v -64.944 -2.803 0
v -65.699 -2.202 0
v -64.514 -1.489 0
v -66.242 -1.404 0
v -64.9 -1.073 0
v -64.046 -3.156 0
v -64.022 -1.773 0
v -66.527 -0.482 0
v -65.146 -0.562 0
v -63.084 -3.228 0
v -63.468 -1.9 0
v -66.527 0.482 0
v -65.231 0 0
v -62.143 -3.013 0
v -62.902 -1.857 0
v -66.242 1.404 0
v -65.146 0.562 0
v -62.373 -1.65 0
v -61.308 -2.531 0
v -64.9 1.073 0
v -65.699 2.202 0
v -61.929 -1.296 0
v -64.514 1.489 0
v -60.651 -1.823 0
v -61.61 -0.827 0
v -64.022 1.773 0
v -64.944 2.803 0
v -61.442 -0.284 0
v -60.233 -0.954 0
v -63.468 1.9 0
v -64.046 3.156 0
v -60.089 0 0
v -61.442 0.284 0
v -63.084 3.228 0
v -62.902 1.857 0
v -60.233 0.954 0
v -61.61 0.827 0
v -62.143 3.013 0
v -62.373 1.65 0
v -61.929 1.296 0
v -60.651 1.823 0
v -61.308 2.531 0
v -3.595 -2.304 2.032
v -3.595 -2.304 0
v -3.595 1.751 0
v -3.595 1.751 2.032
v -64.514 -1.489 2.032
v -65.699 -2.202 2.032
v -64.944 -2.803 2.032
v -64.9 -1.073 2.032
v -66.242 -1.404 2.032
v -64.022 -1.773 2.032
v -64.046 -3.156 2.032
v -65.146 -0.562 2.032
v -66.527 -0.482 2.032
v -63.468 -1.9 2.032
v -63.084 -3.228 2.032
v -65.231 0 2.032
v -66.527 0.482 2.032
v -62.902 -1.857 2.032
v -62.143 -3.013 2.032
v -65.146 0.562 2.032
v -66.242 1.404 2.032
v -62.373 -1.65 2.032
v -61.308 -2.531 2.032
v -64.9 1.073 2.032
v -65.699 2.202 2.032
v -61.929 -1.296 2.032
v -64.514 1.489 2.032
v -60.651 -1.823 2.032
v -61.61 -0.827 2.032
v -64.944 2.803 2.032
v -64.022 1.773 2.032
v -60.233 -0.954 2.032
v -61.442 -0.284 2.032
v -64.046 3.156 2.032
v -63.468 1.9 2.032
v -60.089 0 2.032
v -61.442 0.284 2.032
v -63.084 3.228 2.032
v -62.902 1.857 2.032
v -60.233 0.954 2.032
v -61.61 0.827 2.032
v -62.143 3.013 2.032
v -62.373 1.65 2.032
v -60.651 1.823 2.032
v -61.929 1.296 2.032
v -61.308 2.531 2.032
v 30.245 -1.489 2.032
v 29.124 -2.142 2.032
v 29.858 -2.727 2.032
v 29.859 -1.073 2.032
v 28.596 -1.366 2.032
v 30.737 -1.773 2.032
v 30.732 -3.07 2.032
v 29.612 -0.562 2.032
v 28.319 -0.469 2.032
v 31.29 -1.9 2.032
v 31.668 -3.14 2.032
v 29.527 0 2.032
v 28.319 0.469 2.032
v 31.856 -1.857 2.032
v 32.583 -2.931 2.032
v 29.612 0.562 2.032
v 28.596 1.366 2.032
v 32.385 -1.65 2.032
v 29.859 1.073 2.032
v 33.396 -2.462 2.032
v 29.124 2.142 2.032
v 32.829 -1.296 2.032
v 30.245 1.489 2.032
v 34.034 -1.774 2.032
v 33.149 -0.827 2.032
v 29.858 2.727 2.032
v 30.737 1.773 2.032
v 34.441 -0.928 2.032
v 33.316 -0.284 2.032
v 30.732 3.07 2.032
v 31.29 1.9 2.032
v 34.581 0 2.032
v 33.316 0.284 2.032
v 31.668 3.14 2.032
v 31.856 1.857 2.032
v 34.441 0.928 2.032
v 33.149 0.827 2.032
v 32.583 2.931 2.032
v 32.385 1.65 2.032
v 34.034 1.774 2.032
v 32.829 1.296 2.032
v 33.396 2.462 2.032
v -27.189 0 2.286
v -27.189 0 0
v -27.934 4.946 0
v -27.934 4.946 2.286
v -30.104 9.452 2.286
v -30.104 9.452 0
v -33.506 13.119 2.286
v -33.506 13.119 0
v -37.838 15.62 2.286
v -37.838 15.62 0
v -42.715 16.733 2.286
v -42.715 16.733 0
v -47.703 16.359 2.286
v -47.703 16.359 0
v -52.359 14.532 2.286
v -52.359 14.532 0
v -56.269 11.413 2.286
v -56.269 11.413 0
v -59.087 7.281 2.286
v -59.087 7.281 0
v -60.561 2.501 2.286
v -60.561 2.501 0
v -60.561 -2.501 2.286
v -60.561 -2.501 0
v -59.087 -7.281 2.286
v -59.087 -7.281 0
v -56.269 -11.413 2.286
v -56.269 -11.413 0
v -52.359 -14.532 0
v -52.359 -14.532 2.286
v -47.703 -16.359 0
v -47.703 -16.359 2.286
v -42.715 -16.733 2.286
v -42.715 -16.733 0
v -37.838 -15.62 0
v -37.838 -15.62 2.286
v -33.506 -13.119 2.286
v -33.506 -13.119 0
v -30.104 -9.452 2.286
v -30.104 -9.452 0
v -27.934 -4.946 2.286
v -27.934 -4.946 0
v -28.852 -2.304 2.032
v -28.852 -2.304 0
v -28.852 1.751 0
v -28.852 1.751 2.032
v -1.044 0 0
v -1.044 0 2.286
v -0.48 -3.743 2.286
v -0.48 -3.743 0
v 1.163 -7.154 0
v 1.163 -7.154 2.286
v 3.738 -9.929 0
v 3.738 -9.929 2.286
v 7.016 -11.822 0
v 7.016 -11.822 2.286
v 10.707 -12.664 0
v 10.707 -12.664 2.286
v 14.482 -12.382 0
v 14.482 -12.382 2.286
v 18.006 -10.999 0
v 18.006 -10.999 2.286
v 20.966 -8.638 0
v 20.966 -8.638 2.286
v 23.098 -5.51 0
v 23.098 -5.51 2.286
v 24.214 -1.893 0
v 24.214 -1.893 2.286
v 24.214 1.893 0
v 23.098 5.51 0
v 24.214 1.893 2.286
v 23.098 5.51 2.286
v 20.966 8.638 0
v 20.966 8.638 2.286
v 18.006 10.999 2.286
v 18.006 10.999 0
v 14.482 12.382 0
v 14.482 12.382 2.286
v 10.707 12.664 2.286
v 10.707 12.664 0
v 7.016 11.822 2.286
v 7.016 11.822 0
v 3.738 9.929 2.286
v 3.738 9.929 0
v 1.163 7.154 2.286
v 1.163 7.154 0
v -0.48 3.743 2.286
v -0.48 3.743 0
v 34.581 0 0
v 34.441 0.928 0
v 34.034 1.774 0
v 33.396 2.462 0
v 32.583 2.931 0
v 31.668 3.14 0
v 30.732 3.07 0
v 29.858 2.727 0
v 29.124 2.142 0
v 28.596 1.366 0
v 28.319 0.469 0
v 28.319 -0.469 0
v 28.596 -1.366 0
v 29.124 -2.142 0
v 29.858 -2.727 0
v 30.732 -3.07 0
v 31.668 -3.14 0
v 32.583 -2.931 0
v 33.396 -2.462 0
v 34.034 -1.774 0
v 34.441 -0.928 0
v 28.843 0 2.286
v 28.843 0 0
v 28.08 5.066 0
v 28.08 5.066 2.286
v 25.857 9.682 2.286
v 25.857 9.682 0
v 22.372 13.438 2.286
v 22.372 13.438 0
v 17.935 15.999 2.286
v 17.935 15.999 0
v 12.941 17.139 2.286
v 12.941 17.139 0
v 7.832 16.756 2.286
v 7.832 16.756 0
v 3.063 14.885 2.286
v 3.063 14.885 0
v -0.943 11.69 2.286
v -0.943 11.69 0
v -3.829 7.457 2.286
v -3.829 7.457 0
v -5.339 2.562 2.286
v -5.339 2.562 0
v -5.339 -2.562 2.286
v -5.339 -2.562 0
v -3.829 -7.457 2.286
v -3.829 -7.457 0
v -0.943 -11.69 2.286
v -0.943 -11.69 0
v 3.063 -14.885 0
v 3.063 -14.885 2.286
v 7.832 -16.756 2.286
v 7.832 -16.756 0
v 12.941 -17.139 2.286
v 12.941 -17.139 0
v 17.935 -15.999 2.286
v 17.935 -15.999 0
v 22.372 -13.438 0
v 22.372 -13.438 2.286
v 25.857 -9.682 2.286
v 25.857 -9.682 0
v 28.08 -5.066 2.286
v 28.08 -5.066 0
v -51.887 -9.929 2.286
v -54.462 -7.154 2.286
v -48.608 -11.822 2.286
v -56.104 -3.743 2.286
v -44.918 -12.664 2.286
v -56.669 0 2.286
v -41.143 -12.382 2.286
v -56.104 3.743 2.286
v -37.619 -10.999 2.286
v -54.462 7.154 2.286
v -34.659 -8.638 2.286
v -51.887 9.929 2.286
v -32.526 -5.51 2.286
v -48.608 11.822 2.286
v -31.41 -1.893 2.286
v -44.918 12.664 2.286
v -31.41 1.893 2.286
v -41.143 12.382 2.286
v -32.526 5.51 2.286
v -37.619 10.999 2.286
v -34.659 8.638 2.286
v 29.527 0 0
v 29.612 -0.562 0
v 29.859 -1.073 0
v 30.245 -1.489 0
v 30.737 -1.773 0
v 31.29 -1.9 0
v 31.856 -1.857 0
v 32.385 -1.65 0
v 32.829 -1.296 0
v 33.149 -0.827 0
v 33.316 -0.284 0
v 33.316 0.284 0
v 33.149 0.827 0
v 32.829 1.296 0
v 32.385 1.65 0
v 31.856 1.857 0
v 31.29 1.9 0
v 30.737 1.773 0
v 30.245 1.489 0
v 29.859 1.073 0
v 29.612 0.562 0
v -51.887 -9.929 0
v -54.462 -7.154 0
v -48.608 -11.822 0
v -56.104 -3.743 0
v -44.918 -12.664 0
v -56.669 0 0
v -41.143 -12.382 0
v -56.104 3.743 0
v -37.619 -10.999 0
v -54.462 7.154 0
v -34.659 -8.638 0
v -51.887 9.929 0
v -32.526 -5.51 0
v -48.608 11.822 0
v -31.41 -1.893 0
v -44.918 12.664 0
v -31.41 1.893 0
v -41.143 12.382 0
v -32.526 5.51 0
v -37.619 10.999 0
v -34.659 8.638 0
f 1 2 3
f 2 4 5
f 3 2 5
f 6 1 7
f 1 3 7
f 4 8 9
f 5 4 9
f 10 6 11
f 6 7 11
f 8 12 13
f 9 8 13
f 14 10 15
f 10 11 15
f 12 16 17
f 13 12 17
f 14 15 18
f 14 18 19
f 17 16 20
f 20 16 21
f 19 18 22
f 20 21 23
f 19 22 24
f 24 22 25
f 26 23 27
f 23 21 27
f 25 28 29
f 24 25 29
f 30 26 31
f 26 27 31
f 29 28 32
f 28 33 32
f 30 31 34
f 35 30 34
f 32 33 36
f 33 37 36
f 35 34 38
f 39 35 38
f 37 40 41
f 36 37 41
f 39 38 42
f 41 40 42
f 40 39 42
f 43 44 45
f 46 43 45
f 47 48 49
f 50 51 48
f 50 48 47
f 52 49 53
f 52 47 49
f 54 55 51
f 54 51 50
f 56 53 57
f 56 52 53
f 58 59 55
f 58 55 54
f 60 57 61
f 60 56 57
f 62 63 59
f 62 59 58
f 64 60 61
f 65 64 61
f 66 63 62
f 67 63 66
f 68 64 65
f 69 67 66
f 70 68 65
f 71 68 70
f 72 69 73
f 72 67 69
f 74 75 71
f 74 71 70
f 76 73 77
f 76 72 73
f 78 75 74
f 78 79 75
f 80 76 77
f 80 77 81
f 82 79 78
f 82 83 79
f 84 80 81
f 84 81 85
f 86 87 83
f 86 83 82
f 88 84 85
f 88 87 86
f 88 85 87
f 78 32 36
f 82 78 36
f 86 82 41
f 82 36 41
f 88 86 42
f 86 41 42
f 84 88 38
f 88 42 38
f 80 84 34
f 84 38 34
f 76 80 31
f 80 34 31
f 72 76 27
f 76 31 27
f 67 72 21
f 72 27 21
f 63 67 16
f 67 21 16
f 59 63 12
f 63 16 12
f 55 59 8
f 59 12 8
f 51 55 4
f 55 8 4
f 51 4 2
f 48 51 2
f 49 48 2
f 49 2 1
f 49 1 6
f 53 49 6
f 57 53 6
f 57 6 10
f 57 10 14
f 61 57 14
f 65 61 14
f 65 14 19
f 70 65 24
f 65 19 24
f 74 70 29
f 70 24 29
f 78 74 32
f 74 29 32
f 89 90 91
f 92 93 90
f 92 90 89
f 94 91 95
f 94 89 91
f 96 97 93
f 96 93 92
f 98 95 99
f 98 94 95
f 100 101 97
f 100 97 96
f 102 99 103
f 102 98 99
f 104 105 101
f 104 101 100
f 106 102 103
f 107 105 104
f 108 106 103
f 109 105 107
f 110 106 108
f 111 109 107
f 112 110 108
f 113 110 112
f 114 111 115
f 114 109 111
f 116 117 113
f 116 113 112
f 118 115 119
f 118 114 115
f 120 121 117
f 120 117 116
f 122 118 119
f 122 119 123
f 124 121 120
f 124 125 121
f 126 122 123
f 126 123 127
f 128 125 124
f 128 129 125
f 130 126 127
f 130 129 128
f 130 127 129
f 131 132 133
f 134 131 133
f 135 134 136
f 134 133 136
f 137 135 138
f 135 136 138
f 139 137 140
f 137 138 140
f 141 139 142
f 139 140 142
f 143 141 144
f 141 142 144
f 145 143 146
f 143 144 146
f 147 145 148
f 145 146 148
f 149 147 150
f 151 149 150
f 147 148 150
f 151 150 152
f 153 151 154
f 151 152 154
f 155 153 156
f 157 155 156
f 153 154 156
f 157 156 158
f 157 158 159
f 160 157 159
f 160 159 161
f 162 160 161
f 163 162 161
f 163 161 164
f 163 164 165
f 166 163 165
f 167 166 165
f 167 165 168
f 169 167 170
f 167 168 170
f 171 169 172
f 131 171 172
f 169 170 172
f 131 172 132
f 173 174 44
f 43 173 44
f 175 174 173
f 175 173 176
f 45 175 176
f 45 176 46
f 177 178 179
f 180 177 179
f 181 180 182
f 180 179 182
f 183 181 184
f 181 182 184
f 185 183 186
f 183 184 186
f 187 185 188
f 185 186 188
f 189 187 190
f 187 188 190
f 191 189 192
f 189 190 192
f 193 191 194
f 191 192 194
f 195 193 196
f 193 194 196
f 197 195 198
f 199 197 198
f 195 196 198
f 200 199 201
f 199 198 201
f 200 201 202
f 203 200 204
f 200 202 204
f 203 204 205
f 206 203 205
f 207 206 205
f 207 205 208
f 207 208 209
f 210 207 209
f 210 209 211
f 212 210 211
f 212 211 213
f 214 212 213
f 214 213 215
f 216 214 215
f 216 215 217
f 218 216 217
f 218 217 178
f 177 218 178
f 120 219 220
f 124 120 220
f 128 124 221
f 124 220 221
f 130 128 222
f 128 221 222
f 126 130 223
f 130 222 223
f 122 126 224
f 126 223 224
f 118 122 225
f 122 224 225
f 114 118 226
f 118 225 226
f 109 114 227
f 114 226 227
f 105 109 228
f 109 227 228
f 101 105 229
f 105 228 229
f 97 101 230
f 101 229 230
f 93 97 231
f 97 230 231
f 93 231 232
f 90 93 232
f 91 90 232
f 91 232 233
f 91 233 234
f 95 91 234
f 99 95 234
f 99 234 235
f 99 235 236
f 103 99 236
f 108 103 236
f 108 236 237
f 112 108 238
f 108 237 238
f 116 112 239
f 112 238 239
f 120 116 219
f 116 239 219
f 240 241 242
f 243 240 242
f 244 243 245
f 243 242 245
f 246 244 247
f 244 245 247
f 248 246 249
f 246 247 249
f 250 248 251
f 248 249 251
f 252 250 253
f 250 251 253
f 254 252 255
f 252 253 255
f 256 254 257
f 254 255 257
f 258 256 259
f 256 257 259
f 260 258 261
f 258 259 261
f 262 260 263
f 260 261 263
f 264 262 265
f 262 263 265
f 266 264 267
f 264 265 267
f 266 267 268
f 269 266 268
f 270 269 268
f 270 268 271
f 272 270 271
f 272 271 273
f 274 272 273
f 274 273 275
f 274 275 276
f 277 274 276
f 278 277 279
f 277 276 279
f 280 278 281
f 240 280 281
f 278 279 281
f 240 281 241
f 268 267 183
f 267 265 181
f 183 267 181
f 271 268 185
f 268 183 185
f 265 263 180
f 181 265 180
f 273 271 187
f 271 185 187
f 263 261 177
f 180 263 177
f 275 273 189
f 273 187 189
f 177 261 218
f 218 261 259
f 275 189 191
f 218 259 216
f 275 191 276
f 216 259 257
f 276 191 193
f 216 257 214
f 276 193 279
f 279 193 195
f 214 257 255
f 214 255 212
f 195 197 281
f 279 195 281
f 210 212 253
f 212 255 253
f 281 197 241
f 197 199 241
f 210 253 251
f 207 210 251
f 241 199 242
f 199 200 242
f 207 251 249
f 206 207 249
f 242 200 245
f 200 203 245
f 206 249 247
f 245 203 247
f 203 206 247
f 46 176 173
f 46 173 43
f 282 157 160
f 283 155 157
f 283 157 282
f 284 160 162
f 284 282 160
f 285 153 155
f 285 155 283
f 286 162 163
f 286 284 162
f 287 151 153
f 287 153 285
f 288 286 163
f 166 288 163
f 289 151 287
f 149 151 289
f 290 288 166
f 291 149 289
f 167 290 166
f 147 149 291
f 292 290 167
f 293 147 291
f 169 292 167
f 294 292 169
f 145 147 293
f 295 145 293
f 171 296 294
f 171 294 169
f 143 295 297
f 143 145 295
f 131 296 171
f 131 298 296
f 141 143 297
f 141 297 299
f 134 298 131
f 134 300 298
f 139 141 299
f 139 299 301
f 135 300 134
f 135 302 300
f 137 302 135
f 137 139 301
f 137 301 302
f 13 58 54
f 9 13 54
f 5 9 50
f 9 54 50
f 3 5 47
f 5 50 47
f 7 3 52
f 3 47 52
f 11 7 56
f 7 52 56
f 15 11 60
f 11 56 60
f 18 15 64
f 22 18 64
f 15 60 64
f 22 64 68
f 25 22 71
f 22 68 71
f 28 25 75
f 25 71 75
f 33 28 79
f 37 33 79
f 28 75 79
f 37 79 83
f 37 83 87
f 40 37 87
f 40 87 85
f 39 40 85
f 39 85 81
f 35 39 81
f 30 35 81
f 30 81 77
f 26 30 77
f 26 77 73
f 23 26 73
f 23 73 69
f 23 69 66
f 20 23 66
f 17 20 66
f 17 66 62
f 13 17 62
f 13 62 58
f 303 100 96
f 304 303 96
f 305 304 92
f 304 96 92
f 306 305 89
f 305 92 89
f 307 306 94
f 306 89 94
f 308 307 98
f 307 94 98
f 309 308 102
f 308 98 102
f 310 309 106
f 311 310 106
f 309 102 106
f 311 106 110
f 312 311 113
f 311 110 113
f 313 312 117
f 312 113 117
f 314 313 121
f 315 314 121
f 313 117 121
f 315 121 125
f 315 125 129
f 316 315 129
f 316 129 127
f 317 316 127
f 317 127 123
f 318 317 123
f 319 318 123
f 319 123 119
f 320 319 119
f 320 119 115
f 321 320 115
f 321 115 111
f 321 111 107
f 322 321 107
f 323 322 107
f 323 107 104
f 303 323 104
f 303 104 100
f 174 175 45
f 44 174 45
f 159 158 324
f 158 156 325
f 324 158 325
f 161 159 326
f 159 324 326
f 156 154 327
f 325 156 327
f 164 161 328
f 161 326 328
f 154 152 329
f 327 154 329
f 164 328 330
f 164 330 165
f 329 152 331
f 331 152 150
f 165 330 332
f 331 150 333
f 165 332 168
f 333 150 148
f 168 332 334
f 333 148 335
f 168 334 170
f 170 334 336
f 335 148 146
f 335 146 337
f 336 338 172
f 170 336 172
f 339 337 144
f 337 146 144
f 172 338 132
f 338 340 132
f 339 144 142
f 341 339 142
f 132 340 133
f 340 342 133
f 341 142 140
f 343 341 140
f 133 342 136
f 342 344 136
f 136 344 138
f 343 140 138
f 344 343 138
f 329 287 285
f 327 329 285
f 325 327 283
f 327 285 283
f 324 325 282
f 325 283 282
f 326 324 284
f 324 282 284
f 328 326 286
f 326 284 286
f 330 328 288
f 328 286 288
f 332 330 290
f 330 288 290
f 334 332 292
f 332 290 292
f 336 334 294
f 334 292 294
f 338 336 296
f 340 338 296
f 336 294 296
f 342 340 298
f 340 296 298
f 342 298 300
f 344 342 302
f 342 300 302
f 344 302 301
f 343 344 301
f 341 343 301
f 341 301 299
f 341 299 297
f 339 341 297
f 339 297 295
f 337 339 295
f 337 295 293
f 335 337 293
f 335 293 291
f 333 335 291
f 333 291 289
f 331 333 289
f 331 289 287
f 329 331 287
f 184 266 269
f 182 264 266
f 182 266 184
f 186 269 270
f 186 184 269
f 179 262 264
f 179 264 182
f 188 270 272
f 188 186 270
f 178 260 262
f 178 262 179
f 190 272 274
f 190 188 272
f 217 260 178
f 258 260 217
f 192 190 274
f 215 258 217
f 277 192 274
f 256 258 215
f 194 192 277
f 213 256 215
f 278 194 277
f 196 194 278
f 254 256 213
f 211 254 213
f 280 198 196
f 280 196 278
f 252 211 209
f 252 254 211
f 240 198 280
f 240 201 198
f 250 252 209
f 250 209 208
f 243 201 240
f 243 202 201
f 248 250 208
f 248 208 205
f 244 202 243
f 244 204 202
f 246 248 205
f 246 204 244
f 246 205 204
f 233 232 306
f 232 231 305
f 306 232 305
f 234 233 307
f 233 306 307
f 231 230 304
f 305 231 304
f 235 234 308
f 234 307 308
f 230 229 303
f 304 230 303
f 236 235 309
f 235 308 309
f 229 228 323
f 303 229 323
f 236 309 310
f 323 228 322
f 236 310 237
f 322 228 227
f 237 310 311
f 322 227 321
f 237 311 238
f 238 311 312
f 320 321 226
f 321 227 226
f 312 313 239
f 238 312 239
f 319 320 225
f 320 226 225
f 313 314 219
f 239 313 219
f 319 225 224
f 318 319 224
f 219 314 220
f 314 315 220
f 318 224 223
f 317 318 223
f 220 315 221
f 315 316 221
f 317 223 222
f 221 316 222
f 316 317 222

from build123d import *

# Parameters (mm, degrees)
F0_R     = 16.779966
F0_R_2   = 17.187208
F1_DEPTH = 2.286
F2_D     = 25.4
F3_R     = 3.236856
F3_R_2   = 3.148717
F4_DEPTH = 2.032
F6_D     = 3.81
F7_W     = 25.256614
F7_H     = 4.055806
F8_DEPTH = 2.032


with BuildPart() as f1:
    # F0 (on Top) → F1 (new body)
    with BuildSketch(Plane.XY):
        with Locations((-43.968629, 0)):
            Circle(F0_R)
        with Locations((11.656133, 0)):
            Circle(F0_R_2)
    extrude(amount=F1_DEPTH)

    # F2 (through all)
    with Locations(Plane(origin=(0, 0, 0), x_dir=(1, 0, 0), z_dir=(0, 0, -1))):
        with Locations((-43.968629, 0), (11.656133, 0)):
            Hole(F2_D / 2)


with BuildPart() as f4:
    # F3 (on Top) → F4 (new body)
    with BuildSketch(Plane.XY):
        with Locations((-63.325889, 0)):
            Circle(F3_R)
        with Locations((31.432498, 0)):
            Circle(F3_R_2)
    extrude(amount=F4_DEPTH)

    # F6 (through all)
    with Locations(Plane(origin=(0, 0, 0), x_dir=(1, 0, 0), z_dir=(0, 0, -1))):
        with Locations((-63.325889, 0), (31.432498, 0)):
            Hole(F6_D / 2)


with BuildPart() as f8:
    # F7 (on Top) → F8 (new body)
    with BuildSketch(Plane.XY):
        with Locations((-16.223226, -0.276532)):
            Rectangle(F7_W, F7_H)
    extrude(amount=F8_DEPTH)


solid = Compound([f1.part, f4.part, f8.part])
